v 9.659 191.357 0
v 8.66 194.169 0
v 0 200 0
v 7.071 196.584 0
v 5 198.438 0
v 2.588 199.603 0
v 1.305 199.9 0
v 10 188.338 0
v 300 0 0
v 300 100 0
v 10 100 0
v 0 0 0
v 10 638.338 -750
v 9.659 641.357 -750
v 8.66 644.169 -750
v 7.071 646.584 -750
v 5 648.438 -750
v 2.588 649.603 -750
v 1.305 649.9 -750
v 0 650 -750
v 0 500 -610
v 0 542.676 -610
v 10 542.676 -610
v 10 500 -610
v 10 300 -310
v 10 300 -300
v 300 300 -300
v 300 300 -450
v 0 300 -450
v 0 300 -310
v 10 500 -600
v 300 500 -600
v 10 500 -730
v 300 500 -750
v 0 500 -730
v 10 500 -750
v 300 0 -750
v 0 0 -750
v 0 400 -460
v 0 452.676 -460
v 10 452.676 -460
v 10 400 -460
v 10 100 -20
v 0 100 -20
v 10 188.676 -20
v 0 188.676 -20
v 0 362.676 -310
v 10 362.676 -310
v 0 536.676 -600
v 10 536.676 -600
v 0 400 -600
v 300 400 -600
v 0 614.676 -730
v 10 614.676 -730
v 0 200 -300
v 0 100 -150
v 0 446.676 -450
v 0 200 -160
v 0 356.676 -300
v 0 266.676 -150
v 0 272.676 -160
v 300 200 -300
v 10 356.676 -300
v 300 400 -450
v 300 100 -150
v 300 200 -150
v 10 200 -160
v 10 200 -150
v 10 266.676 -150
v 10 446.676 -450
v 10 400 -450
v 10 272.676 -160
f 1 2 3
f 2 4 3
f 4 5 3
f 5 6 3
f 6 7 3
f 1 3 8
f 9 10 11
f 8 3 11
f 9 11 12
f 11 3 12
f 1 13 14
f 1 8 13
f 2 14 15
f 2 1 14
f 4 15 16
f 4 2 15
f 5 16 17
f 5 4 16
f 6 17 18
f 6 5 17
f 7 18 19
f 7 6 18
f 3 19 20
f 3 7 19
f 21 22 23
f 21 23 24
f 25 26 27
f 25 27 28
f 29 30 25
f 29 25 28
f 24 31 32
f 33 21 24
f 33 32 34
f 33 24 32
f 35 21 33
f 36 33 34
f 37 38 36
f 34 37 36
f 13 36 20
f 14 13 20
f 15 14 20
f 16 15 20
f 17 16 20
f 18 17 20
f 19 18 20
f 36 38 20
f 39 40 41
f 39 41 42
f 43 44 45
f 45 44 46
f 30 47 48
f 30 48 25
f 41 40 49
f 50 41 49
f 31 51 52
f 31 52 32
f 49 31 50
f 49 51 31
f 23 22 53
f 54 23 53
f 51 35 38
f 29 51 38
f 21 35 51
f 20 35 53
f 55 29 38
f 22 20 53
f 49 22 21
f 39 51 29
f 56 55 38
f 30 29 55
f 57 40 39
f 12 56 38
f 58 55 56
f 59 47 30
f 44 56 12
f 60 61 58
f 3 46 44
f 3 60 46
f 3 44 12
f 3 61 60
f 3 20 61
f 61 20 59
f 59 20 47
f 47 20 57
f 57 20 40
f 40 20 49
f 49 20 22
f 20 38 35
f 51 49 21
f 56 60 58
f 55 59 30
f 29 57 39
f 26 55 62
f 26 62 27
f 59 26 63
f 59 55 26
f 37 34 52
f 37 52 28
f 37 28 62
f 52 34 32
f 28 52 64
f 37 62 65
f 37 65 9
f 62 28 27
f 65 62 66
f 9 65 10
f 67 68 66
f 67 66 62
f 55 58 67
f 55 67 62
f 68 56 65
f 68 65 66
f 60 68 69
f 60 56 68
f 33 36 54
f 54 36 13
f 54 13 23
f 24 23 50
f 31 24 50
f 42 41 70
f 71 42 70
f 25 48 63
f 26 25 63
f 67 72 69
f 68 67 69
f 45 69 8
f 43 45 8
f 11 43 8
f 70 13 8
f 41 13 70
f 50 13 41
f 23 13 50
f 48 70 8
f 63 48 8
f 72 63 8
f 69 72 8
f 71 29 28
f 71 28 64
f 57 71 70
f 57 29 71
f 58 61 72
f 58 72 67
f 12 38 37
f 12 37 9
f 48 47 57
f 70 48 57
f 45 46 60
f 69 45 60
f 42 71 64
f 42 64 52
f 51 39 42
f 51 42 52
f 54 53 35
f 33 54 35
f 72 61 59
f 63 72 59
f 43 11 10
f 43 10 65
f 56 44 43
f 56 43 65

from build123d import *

# Parameters (mm, degrees)
BOSS_EXTRUDE1_DEPTH = 300
BOSS_EXTRUDE4_DEPTH = 10
BOSS_EXTRUDE5_DEPTH = 10
FILLET1_R           = 10


with BuildPart() as part:
    # Sketch1 → Boss-Extrude1 (new body)
    with BuildSketch(Plane(origin=(0, 0, 0), x_dir=(0, 0, -1), z_dir=(1, 0, 0))):
        Polygon((0, 0), (0, 100), (150, 100), (150, 200), (300, 200), (300, 300), (450, 300), (450, 400), (600, 400), (600, 500), (750, 500), (750, 0), align=None)
    extrude(amount=BOSS_EXTRUDE1_DEPTH)

    # Sketch5 → Boss-Extrude4 (add)
    with BuildSketch(Plane.ZY):
        Polygon((-750, 500), (-750, 650), (0, 200), (0, 100), (-20, 100), (-20, 188.676192421), (-730, 614.676192421), (-730, 500), align=None)
    extrude(amount=-BOSS_EXTRUDE4_DEPTH)

    # Sketch8 → Boss-Extrude5 (add)
    with BuildSketch(Plane.ZY):
        Polygon((-600, 500), (-600, 536.676192421), (-610, 542.676192421), (-610, 536.676192421), (-610, 500), align=None)
        Polygon((-450, 400), (-450, 446.676192421), (-460, 452.676192421), (-460, 446.676192421), (-460, 400), align=None)
        Polygon((-300, 300), (-300, 356.676192421), (-310, 362.676192421), (-310, 356.676192421), (-310, 300), align=None)
        Polygon((-150, 200), (-150, 266.676192421), (-160, 272.676192421), (-160, 266.676192421), (-160, 200), align=None)
    extrude(amount=-BOSS_EXTRUDE5_DEPTH)

    # Fillet1
    fillet1_edges = [part.edges().sort_by_distance(p)[0] for p in [
        (10, 425, -375),
    ]]
    fillet(fillet1_edges, radius=FILLET1_R - 0.0001)  # a hair under: the kernel refuses the full size


solid = part.part
